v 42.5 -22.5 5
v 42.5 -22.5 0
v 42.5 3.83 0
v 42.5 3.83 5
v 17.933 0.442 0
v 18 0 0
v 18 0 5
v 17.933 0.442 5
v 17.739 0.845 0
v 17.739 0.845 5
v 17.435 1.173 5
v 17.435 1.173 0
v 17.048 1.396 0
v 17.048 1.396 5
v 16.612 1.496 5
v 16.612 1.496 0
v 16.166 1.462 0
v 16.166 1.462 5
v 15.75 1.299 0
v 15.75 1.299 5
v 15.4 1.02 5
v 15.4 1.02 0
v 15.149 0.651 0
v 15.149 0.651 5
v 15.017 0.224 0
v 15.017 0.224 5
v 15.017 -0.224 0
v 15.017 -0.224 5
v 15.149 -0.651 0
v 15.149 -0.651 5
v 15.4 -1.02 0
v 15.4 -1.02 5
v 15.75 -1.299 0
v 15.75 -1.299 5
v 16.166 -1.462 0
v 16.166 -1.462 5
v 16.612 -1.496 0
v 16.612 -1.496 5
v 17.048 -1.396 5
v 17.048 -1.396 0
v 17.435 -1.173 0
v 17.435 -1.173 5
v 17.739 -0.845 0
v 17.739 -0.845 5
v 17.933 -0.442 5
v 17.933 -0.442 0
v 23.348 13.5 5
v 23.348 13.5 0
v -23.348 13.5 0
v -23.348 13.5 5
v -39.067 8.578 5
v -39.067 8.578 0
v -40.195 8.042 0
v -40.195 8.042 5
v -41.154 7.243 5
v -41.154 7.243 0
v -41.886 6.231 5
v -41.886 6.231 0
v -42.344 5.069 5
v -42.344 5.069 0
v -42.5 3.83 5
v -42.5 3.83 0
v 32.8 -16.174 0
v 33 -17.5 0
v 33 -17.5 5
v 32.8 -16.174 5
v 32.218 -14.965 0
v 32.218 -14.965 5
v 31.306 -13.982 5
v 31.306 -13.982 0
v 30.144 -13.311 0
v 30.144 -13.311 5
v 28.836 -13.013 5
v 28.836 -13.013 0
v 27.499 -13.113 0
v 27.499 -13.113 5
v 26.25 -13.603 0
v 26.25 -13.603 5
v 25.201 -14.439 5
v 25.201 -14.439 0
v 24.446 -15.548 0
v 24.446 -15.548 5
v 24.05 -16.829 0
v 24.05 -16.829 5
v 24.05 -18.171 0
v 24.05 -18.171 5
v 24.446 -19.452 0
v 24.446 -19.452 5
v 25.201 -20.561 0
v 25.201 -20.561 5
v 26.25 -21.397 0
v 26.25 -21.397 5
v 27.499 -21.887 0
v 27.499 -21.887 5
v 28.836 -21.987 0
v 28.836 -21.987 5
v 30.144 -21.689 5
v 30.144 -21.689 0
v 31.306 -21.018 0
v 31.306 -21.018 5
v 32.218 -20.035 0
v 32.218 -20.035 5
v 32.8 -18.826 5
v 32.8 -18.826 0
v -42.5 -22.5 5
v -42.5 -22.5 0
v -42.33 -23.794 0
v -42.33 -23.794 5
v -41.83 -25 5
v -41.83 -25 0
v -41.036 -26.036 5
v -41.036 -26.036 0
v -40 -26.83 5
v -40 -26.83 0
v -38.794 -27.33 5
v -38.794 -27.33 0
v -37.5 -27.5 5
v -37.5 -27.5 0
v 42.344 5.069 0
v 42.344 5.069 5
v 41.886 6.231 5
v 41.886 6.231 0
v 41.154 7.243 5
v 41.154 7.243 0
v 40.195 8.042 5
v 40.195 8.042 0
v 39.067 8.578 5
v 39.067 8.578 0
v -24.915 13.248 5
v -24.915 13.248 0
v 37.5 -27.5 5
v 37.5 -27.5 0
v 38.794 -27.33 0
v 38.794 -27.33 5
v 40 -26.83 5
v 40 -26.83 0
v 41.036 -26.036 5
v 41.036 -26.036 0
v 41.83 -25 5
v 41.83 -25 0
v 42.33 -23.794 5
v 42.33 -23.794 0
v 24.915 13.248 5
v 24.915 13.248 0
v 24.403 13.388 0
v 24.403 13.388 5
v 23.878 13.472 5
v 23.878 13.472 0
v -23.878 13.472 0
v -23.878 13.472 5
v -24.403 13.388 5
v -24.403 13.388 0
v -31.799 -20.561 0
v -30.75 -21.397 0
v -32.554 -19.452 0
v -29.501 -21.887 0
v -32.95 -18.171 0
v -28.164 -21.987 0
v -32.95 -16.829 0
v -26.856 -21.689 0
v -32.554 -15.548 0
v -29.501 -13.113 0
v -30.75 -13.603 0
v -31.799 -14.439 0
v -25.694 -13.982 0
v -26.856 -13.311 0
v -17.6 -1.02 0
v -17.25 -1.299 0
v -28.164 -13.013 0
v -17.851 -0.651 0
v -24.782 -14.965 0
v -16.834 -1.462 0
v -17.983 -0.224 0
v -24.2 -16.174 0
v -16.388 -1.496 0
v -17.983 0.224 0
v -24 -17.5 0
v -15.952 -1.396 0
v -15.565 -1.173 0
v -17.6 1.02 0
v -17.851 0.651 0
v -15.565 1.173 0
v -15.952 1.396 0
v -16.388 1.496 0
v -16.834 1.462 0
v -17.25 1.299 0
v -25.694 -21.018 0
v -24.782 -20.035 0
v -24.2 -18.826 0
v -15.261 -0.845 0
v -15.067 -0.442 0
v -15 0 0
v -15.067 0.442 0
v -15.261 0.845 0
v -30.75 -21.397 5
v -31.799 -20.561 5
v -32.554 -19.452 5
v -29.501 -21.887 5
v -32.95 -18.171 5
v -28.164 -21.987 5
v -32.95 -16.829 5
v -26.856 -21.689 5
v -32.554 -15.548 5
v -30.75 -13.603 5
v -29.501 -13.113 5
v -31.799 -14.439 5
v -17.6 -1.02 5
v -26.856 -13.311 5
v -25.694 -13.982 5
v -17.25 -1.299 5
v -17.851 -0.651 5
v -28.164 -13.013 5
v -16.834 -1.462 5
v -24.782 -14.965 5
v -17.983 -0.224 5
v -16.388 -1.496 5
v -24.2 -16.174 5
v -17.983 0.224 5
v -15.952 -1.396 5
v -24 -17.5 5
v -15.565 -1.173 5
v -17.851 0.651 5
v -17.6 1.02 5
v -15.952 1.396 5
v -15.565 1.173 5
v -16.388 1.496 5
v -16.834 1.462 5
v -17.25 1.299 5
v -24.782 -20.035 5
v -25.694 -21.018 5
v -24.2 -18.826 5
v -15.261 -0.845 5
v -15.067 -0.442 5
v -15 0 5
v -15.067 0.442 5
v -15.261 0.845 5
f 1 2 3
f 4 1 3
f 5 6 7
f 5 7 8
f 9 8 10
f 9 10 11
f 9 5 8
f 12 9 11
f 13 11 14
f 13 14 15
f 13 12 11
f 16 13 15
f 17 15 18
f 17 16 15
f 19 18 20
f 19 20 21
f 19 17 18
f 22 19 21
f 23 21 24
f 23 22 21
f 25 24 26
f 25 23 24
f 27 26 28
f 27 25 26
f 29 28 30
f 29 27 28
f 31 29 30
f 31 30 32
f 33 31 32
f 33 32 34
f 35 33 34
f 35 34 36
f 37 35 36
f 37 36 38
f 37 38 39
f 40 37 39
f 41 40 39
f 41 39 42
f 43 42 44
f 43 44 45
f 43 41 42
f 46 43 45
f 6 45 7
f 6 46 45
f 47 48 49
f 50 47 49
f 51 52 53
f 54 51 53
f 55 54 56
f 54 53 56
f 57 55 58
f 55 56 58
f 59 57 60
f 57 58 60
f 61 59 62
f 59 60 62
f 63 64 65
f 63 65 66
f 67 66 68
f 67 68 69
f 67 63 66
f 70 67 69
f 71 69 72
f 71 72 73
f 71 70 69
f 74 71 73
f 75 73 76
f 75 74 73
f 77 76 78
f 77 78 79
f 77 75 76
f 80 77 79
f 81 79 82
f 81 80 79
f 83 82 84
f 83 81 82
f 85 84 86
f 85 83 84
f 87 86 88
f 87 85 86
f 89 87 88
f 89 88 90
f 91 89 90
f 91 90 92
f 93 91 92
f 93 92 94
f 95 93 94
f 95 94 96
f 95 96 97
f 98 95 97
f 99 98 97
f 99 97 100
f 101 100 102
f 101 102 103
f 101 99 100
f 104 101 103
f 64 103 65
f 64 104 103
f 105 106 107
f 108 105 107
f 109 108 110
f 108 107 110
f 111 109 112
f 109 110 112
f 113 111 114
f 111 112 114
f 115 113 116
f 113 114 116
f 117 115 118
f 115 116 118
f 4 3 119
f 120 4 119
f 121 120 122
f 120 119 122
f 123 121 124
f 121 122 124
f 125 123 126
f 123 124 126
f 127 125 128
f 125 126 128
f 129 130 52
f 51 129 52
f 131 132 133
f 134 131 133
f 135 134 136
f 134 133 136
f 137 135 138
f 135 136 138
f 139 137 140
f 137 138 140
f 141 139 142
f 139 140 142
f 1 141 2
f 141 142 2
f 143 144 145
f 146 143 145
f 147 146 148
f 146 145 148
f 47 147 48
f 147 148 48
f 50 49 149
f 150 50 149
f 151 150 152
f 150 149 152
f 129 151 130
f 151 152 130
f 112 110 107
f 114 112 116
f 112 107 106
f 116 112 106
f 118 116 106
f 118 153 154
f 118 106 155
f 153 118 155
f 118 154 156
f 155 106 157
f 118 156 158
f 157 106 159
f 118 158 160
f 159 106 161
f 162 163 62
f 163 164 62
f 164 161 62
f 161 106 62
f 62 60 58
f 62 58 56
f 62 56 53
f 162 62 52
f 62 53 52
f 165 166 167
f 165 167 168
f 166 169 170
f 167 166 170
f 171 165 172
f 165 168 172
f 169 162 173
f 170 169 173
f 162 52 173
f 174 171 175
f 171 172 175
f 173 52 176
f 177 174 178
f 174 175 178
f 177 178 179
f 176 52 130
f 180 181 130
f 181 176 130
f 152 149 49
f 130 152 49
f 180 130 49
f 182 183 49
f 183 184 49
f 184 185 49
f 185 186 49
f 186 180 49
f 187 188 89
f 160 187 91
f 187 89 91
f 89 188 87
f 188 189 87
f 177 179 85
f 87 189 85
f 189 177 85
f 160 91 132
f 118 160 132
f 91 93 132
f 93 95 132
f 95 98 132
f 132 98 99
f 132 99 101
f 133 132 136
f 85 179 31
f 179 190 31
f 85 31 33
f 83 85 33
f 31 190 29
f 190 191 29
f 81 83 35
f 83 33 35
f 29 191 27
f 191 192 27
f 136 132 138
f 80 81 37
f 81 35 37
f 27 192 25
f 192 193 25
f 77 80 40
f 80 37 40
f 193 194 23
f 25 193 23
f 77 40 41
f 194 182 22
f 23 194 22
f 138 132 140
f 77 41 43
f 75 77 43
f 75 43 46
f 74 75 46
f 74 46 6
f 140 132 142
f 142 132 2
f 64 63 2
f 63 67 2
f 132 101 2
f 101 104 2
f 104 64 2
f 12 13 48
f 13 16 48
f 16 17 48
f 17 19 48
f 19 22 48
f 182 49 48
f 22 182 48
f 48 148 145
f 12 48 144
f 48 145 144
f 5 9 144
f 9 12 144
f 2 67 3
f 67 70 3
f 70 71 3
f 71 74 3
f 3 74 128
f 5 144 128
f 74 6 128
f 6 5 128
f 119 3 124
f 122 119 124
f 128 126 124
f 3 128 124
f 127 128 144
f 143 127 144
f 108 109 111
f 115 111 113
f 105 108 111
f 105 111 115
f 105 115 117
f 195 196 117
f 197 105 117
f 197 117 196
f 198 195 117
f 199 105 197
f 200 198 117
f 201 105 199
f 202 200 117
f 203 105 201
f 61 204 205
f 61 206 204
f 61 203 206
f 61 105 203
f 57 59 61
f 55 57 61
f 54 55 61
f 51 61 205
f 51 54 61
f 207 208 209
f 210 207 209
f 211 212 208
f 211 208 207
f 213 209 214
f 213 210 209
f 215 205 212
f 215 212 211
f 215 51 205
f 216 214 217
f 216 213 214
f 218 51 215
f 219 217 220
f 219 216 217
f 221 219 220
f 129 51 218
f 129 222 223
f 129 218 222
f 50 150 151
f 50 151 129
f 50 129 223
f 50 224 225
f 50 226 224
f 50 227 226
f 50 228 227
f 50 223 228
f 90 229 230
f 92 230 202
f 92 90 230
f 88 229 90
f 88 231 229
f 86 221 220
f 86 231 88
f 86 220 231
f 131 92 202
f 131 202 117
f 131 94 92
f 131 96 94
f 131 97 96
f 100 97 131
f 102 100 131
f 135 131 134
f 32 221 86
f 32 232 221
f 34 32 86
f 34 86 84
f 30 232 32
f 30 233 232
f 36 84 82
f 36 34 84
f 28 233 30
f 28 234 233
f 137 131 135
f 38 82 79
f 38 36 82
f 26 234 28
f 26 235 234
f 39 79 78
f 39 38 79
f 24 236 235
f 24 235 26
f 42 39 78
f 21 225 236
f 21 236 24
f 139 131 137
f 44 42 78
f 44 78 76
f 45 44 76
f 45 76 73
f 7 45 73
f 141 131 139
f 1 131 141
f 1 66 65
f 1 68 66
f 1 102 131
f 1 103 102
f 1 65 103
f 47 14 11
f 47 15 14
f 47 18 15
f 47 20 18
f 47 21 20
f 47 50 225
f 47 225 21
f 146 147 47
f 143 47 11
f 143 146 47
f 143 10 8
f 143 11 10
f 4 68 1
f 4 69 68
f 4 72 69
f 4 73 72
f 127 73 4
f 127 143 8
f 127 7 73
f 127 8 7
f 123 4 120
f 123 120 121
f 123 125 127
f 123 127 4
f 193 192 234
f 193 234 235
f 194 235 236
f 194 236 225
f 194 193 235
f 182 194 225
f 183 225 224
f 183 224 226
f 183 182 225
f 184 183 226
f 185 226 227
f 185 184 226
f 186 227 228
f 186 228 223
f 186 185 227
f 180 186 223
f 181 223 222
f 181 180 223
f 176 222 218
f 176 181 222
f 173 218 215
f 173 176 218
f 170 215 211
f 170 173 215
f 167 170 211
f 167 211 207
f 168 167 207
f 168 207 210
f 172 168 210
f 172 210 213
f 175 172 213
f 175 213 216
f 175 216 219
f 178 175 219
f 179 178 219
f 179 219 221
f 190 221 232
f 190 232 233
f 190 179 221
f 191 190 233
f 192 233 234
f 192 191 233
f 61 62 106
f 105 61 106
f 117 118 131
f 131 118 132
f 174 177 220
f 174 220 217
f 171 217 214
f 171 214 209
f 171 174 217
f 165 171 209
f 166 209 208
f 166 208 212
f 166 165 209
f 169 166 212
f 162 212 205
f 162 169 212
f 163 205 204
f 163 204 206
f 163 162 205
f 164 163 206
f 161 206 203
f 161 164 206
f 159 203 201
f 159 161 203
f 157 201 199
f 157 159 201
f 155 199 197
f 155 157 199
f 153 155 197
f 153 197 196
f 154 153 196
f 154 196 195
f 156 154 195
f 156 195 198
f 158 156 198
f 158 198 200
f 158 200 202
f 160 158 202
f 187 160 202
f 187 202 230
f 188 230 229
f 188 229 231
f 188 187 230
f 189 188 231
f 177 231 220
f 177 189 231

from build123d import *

# Parameters (mm, degrees)
F0_R     = 4.5
F0_R_2   = 1.5
F1_DEPTH = 5


with BuildPart() as f1:
    # F0 (on Top) → F1 (new body)
    with BuildSketch(Plane.XY):
        with BuildLine():
            Line((-37.5, -27.5), (37.5, -27.5))
            ThreePointArc((37.5, -27.5), (41.035534, -26.035534), (42.5, -22.5))
            Line((42.5, -22.5), (42.5, 3.83017))
            ThreePointArc((42.5, 3.83017), (41.551788, 6.759848), (39.066796, 8.578344))
            Line((39.066796, 8.578344), (24.914882, 13.248173))
            ThreePointArc((24.914882, 13.248173), (24.141539, 13.436642), (23.348086, 13.5))
            Line((23.348086, 13.5), (0, 13.5))
            Line((0, 13.5), (-23.348086, 13.5))
            ThreePointArc((-23.348086, 13.5), (-24.141539, 13.436642), (-24.914882, 13.248173))
            Line((-24.914882, 13.248173), (-39.066796, 8.578344))
            ThreePointArc((-39.066796, 8.578344), (-41.551788, 6.759848), (-42.5, 3.83017))
            Line((-42.5, 3.83017), (-42.5, -22.5))
            ThreePointArc((-42.5, -22.5), (-41.035534, -26.035534), (-37.5, -27.5))
        make_face()
        with Locations((-28.5, -17.5)):
            Circle(F0_R, mode=Mode.SUBTRACT)
        with Locations((28.5, -17.5)):
            Circle(F0_R, mode=Mode.SUBTRACT)
        with Locations((-16.5, 0)):
            Circle(F0_R_2, mode=Mode.SUBTRACT)
        with Locations((16.5, 0)):
            Circle(F0_R_2, mode=Mode.SUBTRACT)
    extrude(amount=F1_DEPTH)


solid = f1.part
